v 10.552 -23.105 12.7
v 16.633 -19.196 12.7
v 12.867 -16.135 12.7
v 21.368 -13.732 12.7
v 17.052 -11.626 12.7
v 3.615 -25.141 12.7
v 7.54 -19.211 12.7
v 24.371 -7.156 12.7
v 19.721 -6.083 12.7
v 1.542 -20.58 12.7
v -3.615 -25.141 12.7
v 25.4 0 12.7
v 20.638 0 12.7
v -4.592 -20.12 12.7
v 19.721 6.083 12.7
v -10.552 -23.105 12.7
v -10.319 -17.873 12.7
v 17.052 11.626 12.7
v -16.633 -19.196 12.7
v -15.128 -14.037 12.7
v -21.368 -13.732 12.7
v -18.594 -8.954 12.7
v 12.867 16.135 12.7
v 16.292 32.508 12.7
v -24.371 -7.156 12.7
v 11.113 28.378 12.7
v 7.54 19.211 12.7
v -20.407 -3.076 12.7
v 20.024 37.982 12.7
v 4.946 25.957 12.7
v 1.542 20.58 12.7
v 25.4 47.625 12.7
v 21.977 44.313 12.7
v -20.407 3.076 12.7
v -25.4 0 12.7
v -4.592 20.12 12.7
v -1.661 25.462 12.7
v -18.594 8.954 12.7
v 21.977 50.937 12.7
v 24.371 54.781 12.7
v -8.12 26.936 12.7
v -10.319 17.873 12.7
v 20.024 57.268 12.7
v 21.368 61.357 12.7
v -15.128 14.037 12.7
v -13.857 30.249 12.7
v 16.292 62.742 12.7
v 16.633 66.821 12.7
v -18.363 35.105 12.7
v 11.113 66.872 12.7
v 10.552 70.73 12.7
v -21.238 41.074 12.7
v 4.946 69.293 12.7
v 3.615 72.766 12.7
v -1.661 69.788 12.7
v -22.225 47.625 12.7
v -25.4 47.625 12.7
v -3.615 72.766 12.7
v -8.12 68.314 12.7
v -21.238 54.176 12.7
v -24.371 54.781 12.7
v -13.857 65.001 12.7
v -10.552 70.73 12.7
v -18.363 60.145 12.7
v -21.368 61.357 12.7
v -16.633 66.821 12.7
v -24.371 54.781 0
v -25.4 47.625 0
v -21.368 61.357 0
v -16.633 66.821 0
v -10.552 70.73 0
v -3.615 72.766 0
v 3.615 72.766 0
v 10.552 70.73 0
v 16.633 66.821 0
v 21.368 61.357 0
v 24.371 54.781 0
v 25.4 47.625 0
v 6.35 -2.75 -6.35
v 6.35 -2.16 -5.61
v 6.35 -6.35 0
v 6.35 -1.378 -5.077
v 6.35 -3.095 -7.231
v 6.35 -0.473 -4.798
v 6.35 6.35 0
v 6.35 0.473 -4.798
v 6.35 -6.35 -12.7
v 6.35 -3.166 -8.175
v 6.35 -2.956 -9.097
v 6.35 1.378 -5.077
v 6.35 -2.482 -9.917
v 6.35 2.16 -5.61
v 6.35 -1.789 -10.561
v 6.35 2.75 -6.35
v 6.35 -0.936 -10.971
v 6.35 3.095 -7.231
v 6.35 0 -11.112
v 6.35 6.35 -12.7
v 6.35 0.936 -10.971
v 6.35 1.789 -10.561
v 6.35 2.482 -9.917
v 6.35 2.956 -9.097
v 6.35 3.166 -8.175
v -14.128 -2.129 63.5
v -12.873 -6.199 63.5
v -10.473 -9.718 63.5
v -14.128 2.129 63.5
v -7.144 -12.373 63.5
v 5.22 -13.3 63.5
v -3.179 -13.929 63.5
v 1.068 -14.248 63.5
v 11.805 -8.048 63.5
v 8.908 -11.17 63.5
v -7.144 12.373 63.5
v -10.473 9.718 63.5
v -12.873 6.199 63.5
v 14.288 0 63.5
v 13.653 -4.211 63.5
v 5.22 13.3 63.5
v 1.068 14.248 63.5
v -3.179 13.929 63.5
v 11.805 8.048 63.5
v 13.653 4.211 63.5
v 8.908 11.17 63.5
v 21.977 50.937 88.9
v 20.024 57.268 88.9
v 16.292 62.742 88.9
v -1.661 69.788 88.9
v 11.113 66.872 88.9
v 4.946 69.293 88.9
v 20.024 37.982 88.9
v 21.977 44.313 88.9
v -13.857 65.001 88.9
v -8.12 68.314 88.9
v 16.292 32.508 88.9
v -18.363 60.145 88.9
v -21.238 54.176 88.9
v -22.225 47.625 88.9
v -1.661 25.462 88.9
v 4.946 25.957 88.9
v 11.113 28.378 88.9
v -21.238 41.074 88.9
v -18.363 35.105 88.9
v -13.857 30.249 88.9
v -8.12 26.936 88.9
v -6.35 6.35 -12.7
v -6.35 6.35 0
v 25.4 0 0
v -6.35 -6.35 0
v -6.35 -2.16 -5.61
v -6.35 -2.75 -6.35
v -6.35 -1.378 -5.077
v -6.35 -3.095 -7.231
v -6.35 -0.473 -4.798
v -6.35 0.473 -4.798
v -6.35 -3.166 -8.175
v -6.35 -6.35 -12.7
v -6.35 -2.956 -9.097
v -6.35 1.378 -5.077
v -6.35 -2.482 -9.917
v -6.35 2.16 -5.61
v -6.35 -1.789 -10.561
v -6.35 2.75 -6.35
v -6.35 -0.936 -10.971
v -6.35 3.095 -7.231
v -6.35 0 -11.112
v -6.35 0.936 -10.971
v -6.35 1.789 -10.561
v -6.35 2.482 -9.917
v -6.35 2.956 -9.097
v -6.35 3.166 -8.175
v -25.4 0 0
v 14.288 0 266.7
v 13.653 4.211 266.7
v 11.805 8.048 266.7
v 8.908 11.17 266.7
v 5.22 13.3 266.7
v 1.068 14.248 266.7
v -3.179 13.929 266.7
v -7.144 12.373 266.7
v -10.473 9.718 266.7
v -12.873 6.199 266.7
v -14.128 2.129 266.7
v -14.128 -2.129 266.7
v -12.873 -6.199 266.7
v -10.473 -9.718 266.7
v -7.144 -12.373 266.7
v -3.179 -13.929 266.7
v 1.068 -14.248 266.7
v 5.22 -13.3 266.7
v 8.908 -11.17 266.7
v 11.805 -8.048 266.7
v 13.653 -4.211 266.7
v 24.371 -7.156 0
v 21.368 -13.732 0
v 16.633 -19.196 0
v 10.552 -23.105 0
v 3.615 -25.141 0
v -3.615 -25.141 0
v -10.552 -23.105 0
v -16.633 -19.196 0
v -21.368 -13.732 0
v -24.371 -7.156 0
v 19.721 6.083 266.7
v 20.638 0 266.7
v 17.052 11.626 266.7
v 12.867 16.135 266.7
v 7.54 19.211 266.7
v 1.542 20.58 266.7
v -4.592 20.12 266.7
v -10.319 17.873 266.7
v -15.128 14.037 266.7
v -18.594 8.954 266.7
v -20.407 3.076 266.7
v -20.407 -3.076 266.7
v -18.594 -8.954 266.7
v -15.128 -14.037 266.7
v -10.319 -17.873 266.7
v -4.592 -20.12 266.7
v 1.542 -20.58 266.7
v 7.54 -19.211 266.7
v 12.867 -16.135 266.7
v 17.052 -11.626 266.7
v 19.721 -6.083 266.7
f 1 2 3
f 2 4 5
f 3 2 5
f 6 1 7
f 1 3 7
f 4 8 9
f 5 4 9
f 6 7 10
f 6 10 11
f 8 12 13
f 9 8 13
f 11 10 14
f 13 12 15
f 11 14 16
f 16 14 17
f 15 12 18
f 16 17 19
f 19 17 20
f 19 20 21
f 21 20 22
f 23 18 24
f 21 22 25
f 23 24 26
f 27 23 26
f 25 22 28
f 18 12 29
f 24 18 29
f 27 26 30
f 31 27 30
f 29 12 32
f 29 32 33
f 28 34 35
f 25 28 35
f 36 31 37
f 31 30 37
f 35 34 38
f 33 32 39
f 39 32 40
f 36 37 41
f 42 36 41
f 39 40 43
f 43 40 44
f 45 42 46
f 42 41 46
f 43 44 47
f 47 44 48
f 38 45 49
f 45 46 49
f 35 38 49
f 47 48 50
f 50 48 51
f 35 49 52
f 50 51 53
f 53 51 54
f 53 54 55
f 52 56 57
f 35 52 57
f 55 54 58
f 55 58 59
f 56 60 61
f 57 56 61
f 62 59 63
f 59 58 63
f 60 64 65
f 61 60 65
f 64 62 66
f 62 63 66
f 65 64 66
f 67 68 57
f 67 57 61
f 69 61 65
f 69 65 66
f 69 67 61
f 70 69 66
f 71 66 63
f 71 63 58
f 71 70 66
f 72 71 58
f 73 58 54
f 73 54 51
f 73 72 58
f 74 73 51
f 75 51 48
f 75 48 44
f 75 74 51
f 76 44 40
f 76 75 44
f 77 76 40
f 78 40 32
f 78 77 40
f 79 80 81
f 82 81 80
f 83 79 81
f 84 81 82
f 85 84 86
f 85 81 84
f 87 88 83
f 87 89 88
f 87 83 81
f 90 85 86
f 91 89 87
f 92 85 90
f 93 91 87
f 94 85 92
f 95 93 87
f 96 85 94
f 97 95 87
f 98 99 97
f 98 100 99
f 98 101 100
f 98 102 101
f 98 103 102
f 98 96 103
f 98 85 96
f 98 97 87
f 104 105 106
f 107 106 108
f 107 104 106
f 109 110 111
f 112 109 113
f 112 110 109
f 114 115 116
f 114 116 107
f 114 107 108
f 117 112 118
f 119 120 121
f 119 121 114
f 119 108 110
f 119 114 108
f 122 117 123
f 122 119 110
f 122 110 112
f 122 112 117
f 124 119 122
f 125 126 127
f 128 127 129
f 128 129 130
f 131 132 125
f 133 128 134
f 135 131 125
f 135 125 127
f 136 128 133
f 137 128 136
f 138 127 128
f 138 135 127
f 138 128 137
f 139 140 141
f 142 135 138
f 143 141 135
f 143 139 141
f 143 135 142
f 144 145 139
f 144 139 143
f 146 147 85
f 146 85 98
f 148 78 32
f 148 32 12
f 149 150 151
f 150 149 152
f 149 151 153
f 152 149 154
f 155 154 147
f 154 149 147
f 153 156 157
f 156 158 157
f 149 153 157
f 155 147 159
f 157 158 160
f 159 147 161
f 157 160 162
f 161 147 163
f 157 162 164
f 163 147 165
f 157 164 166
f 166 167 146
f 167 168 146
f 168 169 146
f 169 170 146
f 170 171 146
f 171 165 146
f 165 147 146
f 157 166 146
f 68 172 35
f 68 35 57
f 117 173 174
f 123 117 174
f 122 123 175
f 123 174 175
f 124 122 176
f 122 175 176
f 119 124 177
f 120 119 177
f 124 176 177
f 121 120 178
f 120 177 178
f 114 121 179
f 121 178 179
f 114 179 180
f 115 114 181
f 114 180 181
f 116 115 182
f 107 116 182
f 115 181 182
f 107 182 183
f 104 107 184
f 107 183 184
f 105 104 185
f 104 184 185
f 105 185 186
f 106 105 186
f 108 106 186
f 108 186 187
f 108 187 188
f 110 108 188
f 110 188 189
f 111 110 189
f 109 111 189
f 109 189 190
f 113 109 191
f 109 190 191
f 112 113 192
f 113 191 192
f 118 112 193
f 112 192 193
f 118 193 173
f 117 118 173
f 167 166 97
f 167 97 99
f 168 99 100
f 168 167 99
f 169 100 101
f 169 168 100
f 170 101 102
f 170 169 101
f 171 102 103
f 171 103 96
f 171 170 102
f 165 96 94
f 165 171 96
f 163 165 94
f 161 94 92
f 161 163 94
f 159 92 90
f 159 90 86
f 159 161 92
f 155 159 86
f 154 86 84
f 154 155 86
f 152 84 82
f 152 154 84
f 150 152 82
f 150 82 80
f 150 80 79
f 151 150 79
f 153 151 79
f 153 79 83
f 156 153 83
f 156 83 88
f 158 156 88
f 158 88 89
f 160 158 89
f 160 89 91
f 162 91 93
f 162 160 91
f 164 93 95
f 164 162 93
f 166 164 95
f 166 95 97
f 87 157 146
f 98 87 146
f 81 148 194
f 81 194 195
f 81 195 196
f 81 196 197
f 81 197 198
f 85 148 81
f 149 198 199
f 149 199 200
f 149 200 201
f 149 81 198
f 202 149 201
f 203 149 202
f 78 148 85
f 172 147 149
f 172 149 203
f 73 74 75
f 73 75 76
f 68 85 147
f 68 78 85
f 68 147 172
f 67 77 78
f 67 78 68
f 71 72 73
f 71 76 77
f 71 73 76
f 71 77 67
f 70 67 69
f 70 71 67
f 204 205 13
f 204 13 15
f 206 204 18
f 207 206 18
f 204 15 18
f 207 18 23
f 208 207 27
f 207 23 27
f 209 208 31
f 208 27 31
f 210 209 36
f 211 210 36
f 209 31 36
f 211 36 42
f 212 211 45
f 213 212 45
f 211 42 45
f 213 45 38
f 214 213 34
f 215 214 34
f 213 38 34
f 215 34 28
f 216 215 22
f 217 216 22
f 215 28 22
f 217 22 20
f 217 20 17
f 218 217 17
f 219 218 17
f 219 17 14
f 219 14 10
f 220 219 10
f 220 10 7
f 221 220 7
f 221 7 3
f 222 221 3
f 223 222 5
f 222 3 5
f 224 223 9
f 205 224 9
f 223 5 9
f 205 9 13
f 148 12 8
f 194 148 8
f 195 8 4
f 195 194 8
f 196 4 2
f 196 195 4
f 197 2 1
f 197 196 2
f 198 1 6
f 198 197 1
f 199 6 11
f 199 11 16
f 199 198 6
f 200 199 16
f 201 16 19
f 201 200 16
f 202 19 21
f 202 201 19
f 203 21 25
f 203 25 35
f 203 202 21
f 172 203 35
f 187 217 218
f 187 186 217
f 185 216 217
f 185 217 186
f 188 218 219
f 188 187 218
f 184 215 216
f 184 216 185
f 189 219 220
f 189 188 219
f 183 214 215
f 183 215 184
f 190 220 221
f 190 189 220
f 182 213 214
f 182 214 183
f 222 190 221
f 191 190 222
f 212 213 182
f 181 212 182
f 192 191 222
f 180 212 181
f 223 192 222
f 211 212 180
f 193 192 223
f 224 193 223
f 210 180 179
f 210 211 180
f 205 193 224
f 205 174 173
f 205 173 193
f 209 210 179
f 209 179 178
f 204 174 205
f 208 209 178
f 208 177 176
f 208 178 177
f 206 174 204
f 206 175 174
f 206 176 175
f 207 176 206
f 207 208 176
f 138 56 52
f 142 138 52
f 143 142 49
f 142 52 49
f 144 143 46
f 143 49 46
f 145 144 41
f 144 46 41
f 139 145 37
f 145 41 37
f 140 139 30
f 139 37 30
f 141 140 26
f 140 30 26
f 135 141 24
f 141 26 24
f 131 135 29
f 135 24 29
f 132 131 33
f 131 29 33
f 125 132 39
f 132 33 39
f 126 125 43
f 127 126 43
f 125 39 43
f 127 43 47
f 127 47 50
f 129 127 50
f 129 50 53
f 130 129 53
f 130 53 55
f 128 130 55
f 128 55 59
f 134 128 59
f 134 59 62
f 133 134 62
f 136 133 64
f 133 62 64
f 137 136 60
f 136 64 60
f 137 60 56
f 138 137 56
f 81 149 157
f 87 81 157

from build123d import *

# Parameters (mm, degrees)
BOSS_EXTRUDE1_DEPTH      = 12.7
SKETCH2_R                = 22.225
BOSS_EXTRUDE2_DEPTH      = 76.2
SKETCH3_R                = 20.6375
BOSS_EXTRUDE3_DEPTH      = 254
SKETCH4_R                = 14.2875
CUT_EXTRUDE1_DEPTH       = 203.2
BOSS_EXTRUDE4_DEPTH      = 6.35
BOSS_EXTRUDE4_DEPTH_BACK = 6.35
SKETCH5_W                = 12.7
SKETCH5_H                = 12.7
SKETCH5_R                = 3.175


with BuildPart() as part:
    # Sketch1 → Boss-Extrude1 (new body)
    with BuildSketch(Plane.XY):
        with BuildLine():
            Line((-25.4, 0), (-25.4, 47.625))
            ThreePointArc((-25.4, 47.625), (0, 73.025), (25.4, 47.625))
            Line((25.4, 47.625), (25.4, 0))
            ThreePointArc((25.4, 0), (0, -25.4), (-25.4, 0))
        make_face()
    extrude(amount=BOSS_EXTRUDE1_DEPTH)

    # Sketch2 → Boss-Extrude2 (add)
    with BuildSketch(Plane.XY.offset(12.7)):
        with Locations(Location((0, 47.625, 0), (0, 0, 180))):
            Circle(SKETCH2_R)
    extrude(amount=BOSS_EXTRUDE2_DEPTH)

    # Sketch3 → Boss-Extrude3 (add)
    with BuildSketch(Plane.XY.offset(12.7)):
        Circle(SKETCH3_R)
    extrude(amount=BOSS_EXTRUDE3_DEPTH)

    # Sketch4 → Cut-Extrude1 (cut)
    with BuildSketch(Plane.XY.offset(266.7)):
        Circle(SKETCH4_R)
    extrude(amount=-CUT_EXTRUDE1_DEPTH, mode=Mode.SUBTRACT)

    # Sketch5 → Boss-Extrude4 (add, two sides: drawn at the far end of the back side and taken through both)
    with BuildSketch(Plane(origin=(0, 0, 0), x_dir=(0, 0, -1), z_dir=(1, 0, 0)).offset(-BOSS_EXTRUDE4_DEPTH_BACK)):
        with Locations((6.35, 0)):
            Rectangle(SKETCH5_W, SKETCH5_H)
        with Locations((7.9375, 0)):
            Circle(SKETCH5_R, mode=Mode.SUBTRACT)
    extrude(amount=BOSS_EXTRUDE4_DEPTH + BOSS_EXTRUDE4_DEPTH_BACK)


solid = part.part
